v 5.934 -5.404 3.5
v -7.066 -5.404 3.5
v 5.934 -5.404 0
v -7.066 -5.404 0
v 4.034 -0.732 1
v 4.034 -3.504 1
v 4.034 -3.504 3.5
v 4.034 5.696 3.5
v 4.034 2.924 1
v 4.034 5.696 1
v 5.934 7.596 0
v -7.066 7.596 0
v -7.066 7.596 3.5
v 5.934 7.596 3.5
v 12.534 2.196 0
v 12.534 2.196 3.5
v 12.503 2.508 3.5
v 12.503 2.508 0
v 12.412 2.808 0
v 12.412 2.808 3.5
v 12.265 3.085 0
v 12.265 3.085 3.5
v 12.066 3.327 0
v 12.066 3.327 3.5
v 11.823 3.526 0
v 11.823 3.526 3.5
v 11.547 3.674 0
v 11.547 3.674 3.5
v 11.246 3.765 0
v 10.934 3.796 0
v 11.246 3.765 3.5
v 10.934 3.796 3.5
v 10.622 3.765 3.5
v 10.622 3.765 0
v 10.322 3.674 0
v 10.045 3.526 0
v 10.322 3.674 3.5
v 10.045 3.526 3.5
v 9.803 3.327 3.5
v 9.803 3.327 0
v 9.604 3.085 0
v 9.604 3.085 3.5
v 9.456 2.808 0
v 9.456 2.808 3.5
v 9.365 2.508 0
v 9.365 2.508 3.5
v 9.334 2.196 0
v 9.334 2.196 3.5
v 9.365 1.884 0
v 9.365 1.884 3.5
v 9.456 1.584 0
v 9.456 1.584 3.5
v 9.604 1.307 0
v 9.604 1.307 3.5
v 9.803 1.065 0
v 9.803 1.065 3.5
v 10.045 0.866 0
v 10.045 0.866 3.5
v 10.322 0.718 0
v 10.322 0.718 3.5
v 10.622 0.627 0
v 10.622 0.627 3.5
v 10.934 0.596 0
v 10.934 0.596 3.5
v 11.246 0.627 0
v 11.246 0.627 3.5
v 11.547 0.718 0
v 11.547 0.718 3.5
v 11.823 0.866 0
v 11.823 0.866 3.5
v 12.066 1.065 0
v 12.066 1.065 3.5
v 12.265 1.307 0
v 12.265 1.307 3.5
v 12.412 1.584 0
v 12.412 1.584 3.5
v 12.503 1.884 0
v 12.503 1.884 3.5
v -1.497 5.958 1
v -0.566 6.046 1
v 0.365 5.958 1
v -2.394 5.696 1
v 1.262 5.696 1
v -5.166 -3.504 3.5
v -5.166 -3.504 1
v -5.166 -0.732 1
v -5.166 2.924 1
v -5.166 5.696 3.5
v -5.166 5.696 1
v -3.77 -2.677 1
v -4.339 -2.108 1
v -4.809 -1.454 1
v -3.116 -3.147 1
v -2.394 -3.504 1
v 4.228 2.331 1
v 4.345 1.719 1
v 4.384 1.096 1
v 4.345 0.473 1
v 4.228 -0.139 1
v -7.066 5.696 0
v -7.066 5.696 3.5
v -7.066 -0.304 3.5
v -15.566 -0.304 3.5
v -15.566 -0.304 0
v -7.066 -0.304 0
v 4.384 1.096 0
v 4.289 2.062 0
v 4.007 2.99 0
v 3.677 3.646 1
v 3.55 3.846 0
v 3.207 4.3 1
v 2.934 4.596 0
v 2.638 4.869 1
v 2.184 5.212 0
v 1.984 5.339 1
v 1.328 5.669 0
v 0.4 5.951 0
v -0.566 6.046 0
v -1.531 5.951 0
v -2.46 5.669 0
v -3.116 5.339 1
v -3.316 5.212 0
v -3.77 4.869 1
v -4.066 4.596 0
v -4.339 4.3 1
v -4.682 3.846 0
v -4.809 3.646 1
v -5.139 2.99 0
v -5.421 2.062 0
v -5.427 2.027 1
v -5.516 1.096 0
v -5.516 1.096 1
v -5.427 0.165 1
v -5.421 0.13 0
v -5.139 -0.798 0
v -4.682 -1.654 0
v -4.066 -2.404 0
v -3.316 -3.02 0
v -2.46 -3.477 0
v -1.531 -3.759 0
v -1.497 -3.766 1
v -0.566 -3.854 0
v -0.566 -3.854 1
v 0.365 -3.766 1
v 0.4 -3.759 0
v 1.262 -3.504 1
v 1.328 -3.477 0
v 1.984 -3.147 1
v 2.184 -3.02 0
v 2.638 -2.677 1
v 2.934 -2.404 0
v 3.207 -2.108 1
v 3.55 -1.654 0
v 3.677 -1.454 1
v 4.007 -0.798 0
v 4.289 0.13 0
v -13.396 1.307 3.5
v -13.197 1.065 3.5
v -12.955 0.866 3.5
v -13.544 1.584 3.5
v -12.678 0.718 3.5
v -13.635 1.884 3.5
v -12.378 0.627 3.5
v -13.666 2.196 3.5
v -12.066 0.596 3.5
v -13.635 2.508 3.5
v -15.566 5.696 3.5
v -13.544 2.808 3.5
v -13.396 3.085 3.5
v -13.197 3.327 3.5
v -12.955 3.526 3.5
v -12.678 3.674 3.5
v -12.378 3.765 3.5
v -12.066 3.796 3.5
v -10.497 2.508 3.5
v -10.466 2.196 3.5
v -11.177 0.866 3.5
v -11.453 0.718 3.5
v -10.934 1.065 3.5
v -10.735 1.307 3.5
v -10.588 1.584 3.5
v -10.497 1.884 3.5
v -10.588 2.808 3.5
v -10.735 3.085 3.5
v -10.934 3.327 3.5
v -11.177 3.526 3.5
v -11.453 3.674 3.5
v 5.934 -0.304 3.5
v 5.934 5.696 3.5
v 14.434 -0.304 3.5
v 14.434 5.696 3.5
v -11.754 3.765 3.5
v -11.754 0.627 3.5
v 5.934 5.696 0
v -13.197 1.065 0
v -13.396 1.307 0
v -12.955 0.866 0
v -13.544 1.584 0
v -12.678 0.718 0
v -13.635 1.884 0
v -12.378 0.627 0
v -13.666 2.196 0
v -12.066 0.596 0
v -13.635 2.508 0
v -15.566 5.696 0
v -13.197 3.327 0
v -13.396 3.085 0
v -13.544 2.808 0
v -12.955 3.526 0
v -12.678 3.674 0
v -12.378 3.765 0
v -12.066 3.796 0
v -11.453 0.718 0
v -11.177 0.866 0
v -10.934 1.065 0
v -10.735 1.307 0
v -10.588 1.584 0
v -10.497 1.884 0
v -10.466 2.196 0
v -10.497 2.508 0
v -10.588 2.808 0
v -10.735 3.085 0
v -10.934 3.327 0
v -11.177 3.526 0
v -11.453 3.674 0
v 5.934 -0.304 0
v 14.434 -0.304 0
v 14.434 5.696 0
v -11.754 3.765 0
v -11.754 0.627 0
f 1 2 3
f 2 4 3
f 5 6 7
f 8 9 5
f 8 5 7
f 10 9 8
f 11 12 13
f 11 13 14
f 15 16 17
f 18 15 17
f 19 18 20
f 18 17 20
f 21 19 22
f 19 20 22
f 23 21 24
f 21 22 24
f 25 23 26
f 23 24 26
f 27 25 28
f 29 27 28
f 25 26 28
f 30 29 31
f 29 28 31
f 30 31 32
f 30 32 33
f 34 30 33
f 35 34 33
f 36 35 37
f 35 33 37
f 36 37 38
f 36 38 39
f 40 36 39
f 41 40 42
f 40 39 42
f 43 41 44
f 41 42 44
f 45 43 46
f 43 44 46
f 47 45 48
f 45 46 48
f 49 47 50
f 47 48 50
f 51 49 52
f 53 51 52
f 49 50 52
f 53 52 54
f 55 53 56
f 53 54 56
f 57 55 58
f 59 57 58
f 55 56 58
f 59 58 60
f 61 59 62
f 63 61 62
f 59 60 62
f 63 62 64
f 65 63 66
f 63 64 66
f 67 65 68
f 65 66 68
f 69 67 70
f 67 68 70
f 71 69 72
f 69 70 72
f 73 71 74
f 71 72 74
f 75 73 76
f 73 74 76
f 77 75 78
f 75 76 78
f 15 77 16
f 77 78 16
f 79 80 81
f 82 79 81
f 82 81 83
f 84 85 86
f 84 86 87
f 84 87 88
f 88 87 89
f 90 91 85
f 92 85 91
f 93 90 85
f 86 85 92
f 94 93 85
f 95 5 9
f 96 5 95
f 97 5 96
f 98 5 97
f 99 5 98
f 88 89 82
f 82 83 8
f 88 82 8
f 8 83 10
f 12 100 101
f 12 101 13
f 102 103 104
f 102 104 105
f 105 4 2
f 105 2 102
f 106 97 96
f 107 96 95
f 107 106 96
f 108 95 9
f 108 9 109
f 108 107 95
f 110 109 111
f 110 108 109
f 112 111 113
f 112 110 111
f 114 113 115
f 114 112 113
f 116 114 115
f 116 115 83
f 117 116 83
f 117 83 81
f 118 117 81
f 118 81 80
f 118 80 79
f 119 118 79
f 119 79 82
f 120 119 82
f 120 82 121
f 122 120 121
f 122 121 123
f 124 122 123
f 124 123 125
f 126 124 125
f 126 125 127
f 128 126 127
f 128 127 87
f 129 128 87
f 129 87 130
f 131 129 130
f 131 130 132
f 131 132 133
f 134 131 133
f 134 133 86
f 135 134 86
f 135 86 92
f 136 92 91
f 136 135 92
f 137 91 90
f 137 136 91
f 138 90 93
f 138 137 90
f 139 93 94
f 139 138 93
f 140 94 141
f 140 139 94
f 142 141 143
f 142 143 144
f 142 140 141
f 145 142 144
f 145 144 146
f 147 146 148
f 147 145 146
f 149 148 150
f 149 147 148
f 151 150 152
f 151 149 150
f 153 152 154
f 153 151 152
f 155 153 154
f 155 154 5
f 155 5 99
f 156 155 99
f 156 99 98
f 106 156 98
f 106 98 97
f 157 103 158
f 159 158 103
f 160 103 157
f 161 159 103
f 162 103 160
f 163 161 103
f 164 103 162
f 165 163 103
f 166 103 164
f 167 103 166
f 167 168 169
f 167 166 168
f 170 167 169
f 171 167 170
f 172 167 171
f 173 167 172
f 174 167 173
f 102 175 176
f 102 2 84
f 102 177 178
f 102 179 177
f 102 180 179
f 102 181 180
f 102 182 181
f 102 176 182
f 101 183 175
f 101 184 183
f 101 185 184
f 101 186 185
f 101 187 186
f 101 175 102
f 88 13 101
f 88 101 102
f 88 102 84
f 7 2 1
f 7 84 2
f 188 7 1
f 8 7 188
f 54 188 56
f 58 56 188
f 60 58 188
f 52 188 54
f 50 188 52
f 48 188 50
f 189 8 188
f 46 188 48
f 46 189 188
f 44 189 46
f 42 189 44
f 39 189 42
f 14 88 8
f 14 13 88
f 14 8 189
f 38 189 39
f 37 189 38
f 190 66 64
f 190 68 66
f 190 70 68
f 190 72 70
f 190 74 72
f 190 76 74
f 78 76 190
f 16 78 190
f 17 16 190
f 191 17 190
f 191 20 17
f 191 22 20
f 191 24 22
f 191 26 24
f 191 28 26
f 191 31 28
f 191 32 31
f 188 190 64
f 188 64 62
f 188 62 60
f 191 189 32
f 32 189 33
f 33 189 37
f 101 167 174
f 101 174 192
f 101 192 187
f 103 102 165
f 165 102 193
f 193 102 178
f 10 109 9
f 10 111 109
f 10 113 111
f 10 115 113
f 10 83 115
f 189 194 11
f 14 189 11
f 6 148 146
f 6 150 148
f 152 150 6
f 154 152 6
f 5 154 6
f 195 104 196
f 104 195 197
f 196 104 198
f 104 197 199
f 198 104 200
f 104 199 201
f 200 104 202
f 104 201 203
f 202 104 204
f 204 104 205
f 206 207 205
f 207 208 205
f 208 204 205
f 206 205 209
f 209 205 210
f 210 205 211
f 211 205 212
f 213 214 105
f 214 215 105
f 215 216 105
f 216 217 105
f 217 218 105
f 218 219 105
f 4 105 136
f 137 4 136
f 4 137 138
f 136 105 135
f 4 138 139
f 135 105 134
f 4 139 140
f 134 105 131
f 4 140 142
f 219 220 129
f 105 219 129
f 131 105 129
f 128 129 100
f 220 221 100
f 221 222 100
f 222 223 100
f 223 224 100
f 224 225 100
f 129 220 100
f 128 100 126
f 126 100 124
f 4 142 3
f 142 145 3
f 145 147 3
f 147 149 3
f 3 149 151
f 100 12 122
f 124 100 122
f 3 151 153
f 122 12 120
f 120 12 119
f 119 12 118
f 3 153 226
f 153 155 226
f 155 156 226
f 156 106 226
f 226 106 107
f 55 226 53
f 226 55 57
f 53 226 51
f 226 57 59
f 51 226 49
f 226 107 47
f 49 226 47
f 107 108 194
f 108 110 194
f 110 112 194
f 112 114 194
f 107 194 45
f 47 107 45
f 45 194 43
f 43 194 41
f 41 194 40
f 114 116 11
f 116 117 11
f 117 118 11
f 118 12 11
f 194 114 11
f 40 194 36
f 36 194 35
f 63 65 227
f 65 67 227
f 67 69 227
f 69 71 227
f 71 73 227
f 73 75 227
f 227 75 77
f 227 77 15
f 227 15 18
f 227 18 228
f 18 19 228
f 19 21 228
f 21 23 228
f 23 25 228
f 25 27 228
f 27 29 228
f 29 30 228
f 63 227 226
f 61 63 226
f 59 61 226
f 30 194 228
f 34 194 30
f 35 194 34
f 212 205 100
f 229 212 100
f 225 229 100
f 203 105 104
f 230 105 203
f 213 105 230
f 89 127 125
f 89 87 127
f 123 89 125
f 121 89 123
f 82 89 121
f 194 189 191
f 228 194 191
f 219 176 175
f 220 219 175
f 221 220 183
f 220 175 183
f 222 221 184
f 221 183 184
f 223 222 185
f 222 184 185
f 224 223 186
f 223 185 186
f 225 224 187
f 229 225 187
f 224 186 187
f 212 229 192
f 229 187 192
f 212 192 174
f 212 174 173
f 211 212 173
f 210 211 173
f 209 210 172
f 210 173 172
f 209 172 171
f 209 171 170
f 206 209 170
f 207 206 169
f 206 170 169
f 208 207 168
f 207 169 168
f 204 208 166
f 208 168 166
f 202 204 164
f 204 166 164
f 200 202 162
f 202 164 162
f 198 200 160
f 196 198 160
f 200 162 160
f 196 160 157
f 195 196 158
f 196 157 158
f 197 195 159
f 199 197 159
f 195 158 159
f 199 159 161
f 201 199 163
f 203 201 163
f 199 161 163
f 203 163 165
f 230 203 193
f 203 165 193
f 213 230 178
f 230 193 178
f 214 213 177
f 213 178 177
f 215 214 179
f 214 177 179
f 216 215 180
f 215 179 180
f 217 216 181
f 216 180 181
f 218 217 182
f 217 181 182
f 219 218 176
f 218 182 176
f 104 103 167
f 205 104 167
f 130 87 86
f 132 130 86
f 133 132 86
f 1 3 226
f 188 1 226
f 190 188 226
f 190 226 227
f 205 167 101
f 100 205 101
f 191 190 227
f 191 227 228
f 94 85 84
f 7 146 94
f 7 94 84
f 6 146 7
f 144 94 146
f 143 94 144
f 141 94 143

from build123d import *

# Parameters (mm, degrees)
SKETCH_1_W      = 13
SKETCH_1_H      = 13
SKETCH_1_R      = 4.95
EXTRUDE_1_DEPTH = 1
SKETCH_2_W      = 13
SKETCH_2_H      = 13
SKETCH_2_W_2    = 9.2
SKETCH_2_H_2    = 9.2
EXTRUDE_2_DEPTH = 2.5
SKETCH_3_W      = 8.5
SKETCH_3_H      = 6
SKETCH_3_R      = 1.6
EXTRUDE_3_DEPTH = 3.5


with BuildPart() as part:
    # 草图1 → 凸台-拉伸1 (new body)
    with BuildSketch(Plane.XY):
        with Locations((-0.565783989, 1.095956893)):
            Rectangle(SKETCH_1_W, SKETCH_1_H)
        with Locations((-0.565783989, 1.095956893)):
            Circle(SKETCH_1_R, mode=Mode.SUBTRACT)
    extrude(amount=EXTRUDE_1_DEPTH)

    # 草图2 → 凸台-拉伸2 (add)
    with BuildSketch(Plane.XY.offset(1)):
        with Locations((-0.565783989, 1.095956893)):
            Rectangle(SKETCH_2_W, SKETCH_2_H)
        with Locations((-0.565783989, 1.095956893)):
            Rectangle(SKETCH_2_W_2, SKETCH_2_H_2, mode=Mode.SUBTRACT)
    extrude(amount=EXTRUDE_2_DEPTH)

    # 草图3 → 凸台-拉伸3 (add)
    with BuildSketch(Plane.XY.offset(3.5)):
        with Locations((10.184216011, 2.695956893)):
            Rectangle(SKETCH_3_W, SKETCH_3_H)
        with Locations((10.934216011, 2.195956893)):
            Circle(SKETCH_3_R, mode=Mode.SUBTRACT)
        with Locations((-11.315783989, 2.695956893)):
            Rectangle(SKETCH_3_W, SKETCH_3_H)
        with Locations((-12.065783989, 2.195956893)):
            Circle(SKETCH_3_R, mode=Mode.SUBTRACT)
    extrude(amount=-EXTRUDE_3_DEPTH)


solid = part.part
